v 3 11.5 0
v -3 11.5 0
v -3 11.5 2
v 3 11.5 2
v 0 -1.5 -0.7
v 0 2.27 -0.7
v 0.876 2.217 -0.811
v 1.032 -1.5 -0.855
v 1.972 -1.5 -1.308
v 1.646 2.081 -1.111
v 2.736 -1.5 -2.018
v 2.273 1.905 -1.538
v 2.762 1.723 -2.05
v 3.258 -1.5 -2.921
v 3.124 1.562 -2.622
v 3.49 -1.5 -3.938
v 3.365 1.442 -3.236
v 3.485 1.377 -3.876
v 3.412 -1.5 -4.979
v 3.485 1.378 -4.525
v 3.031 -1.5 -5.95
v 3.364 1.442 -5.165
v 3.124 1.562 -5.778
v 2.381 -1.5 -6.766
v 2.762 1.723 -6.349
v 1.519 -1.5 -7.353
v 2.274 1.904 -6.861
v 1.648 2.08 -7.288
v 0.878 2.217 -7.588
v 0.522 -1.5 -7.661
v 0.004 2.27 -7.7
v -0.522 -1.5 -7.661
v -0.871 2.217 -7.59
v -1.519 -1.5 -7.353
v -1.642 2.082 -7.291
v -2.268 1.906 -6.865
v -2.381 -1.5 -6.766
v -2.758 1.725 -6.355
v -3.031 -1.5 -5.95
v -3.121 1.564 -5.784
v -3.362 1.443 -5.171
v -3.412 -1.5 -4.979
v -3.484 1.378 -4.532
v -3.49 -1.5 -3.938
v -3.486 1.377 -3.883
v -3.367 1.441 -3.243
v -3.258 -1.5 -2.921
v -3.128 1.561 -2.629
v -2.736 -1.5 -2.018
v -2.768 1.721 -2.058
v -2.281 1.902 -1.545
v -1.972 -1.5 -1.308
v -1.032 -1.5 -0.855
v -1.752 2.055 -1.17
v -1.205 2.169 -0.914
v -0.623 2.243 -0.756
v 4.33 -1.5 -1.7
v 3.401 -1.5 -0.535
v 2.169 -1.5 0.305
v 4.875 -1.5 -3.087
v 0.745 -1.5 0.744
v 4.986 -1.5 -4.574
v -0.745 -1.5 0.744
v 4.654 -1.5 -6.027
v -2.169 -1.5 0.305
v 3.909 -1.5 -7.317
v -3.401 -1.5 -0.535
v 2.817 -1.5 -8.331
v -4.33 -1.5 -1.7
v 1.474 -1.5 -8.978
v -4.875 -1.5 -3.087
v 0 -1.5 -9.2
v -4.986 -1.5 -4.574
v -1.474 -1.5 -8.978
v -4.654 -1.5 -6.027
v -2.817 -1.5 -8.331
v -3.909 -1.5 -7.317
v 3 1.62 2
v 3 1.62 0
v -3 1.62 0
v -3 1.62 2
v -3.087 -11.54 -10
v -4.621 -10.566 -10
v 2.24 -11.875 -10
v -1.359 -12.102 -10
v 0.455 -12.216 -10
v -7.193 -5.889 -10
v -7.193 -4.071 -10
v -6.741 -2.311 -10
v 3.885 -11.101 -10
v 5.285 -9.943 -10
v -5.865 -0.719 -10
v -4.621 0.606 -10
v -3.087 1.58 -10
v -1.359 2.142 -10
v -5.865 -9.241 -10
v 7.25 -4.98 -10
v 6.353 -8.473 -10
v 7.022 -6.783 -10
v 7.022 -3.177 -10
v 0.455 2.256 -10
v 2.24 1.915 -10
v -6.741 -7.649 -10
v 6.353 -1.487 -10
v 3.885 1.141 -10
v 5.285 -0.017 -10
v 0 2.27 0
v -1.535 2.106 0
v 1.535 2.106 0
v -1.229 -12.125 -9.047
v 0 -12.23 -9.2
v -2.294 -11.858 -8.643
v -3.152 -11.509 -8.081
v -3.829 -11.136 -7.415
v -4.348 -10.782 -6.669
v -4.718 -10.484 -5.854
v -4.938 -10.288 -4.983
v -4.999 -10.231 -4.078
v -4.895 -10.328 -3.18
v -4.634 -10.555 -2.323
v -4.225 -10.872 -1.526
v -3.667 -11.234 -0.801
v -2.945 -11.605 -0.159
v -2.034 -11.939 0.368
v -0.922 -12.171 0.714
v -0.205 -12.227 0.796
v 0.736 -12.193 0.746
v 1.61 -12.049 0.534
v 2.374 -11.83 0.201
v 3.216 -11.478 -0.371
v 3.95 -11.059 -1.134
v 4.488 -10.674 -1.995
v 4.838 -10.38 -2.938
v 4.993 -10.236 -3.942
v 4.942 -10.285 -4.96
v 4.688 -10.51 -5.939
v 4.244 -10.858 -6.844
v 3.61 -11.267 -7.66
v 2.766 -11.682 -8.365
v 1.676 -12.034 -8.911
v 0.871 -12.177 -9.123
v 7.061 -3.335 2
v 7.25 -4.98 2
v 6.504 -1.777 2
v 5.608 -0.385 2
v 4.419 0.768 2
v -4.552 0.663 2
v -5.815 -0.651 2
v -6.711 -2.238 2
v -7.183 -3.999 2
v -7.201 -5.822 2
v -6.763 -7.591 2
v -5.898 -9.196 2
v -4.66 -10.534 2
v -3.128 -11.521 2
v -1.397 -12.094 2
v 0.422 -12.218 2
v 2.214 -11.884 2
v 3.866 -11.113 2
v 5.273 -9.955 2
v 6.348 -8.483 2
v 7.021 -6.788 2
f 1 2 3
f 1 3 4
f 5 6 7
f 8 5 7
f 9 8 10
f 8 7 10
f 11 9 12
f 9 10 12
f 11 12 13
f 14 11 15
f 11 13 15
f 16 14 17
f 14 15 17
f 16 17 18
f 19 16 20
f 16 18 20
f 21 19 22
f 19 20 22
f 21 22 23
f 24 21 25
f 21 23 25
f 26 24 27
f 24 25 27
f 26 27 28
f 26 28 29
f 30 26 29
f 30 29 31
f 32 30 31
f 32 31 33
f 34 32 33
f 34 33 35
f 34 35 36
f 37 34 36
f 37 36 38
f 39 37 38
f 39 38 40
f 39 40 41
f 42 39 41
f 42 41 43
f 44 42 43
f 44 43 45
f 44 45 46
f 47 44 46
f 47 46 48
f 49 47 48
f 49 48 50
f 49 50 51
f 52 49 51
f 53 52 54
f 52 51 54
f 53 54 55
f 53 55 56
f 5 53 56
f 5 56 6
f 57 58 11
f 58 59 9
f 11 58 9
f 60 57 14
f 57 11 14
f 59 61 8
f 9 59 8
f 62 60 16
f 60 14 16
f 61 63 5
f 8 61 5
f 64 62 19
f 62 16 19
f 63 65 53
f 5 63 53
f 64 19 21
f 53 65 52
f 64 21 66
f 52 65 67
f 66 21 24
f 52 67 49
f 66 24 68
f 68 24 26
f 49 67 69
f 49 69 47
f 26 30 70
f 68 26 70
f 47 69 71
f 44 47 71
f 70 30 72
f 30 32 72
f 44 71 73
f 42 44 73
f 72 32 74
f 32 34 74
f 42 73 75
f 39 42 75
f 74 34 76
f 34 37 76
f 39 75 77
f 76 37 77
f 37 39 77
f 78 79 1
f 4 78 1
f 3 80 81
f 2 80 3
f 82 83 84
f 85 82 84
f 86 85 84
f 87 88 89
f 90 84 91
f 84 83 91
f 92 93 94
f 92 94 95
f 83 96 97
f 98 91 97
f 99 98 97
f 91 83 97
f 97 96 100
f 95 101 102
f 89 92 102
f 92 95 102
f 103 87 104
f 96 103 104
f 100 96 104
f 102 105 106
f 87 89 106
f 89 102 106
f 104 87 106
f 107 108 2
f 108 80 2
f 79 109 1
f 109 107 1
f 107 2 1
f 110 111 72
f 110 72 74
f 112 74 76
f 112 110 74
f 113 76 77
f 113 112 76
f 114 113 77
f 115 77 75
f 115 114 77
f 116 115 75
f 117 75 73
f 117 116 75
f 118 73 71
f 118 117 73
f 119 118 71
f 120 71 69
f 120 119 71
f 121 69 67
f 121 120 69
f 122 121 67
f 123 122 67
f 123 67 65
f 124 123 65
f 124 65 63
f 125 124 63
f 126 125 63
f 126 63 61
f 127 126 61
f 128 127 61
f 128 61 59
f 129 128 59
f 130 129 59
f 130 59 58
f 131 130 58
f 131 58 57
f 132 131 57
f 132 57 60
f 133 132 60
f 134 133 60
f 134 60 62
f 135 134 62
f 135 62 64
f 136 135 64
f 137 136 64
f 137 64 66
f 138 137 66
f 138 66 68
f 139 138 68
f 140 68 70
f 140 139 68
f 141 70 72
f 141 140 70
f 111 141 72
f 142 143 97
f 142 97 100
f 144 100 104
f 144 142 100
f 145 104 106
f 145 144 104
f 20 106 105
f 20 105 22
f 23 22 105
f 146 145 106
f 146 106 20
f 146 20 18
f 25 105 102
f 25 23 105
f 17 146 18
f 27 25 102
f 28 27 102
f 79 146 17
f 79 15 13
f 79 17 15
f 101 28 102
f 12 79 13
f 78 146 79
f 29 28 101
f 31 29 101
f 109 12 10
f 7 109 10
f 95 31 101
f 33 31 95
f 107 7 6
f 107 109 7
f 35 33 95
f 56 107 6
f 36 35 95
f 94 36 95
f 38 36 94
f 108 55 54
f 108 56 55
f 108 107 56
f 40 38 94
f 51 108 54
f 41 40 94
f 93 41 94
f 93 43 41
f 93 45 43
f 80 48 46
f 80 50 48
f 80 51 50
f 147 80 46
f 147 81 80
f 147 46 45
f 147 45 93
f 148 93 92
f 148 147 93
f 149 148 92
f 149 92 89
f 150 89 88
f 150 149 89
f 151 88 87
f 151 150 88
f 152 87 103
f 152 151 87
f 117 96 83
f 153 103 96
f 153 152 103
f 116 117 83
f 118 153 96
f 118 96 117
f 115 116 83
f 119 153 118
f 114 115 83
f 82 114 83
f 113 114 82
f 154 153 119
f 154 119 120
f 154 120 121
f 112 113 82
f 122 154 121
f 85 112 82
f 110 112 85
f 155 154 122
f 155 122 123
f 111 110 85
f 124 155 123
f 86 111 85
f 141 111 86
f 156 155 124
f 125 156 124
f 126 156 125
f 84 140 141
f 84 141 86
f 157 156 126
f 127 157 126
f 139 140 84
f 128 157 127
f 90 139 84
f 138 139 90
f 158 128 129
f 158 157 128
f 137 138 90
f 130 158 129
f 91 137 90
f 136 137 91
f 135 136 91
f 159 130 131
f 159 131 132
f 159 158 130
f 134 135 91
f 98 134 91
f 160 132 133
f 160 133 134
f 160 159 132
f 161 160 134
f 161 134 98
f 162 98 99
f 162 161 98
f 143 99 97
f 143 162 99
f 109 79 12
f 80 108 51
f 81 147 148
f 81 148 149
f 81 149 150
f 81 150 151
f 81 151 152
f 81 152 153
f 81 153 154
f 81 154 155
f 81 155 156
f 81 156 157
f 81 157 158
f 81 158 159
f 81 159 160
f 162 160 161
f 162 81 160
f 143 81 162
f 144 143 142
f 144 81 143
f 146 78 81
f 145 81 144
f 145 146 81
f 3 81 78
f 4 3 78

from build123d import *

# Parameters (mm, degrees)
SKETCH_1_W               = 6
SKETCH_1_H               = 23
EXTRUDE_1_DEPTH          = 2
SKETCH_4_W               = 6
SKETCH_4_H               = 4.448435562
CUT_EXTRUDE_1_DEPTH      = 13.051970793
SKETCH_2_R               = 7.25
EXTRUDE_2_DEPTH          = 12
SKETCH_5_R               = 3.5
CUT_EXTRUDE_2_DEPTH      = 27.752110197
CUT_EXTRUDE_3_DEPTH      = 2.75
CUT_EXTRUDE_3_DEPTH_BACK = 10
SKETCH_6_R               = 5


with BuildPart() as part:
    # 草图1 → 凸台-拉伸1 (new body)
    with BuildSketch(Plane.XY):
        Rectangle(SKETCH_1_W, SKETCH_1_H)
    extrude(amount=EXTRUDE_1_DEPTH)

    # 草图4 → 切除-拉伸1 (cut, through all)
    with BuildSketch(Plane(origin=(0, 0, 0), x_dir=(-1, 0, 0), z_dir=(0, 0, -1))):
        with Locations((0, -9.275782219)):
            Rectangle(SKETCH_4_W, SKETCH_4_H)
    extrude(amount=-CUT_EXTRUDE_1_DEPTH, mode=Mode.SUBTRACT)

    # 草图2 → 凸台-拉伸2 (add)
    with BuildSketch(Plane.XY.offset(2)):
        with Locations((0, -4.98)):
            Circle(SKETCH_2_R)
    extrude(amount=-EXTRUDE_2_DEPTH)

    # 草图5 → 切除-拉伸2 (cut, through all)
    with BuildSketch(Plane(origin=(0, 11.5, 0), x_dir=(1, 0, 0), z_dir=(0, 1, 0))):
        with Locations(Location((0, 4.2, 0), (0, 0, 270))):
            Circle(SKETCH_5_R)
    extrude(amount=-CUT_EXTRUDE_2_DEPTH, mode=Mode.SUBTRACT)

    # 草图6 → 切除-拉伸3 (cut, two sides: drawn at the far end of the back side and taken through both)
    with BuildSketch(Plane(origin=(0, -4.25, 0), x_dir=(1, 0, 0), z_dir=(0, 1, 0)).offset(-CUT_EXTRUDE_3_DEPTH_BACK)):
        with Locations(Location((0, 4.2, 0), (0, 0, 90))):
            Circle(SKETCH_6_R)
    extrude(amount=CUT_EXTRUDE_3_DEPTH + CUT_EXTRUDE_3_DEPTH_BACK, mode=Mode.SUBTRACT)


solid = part.part
